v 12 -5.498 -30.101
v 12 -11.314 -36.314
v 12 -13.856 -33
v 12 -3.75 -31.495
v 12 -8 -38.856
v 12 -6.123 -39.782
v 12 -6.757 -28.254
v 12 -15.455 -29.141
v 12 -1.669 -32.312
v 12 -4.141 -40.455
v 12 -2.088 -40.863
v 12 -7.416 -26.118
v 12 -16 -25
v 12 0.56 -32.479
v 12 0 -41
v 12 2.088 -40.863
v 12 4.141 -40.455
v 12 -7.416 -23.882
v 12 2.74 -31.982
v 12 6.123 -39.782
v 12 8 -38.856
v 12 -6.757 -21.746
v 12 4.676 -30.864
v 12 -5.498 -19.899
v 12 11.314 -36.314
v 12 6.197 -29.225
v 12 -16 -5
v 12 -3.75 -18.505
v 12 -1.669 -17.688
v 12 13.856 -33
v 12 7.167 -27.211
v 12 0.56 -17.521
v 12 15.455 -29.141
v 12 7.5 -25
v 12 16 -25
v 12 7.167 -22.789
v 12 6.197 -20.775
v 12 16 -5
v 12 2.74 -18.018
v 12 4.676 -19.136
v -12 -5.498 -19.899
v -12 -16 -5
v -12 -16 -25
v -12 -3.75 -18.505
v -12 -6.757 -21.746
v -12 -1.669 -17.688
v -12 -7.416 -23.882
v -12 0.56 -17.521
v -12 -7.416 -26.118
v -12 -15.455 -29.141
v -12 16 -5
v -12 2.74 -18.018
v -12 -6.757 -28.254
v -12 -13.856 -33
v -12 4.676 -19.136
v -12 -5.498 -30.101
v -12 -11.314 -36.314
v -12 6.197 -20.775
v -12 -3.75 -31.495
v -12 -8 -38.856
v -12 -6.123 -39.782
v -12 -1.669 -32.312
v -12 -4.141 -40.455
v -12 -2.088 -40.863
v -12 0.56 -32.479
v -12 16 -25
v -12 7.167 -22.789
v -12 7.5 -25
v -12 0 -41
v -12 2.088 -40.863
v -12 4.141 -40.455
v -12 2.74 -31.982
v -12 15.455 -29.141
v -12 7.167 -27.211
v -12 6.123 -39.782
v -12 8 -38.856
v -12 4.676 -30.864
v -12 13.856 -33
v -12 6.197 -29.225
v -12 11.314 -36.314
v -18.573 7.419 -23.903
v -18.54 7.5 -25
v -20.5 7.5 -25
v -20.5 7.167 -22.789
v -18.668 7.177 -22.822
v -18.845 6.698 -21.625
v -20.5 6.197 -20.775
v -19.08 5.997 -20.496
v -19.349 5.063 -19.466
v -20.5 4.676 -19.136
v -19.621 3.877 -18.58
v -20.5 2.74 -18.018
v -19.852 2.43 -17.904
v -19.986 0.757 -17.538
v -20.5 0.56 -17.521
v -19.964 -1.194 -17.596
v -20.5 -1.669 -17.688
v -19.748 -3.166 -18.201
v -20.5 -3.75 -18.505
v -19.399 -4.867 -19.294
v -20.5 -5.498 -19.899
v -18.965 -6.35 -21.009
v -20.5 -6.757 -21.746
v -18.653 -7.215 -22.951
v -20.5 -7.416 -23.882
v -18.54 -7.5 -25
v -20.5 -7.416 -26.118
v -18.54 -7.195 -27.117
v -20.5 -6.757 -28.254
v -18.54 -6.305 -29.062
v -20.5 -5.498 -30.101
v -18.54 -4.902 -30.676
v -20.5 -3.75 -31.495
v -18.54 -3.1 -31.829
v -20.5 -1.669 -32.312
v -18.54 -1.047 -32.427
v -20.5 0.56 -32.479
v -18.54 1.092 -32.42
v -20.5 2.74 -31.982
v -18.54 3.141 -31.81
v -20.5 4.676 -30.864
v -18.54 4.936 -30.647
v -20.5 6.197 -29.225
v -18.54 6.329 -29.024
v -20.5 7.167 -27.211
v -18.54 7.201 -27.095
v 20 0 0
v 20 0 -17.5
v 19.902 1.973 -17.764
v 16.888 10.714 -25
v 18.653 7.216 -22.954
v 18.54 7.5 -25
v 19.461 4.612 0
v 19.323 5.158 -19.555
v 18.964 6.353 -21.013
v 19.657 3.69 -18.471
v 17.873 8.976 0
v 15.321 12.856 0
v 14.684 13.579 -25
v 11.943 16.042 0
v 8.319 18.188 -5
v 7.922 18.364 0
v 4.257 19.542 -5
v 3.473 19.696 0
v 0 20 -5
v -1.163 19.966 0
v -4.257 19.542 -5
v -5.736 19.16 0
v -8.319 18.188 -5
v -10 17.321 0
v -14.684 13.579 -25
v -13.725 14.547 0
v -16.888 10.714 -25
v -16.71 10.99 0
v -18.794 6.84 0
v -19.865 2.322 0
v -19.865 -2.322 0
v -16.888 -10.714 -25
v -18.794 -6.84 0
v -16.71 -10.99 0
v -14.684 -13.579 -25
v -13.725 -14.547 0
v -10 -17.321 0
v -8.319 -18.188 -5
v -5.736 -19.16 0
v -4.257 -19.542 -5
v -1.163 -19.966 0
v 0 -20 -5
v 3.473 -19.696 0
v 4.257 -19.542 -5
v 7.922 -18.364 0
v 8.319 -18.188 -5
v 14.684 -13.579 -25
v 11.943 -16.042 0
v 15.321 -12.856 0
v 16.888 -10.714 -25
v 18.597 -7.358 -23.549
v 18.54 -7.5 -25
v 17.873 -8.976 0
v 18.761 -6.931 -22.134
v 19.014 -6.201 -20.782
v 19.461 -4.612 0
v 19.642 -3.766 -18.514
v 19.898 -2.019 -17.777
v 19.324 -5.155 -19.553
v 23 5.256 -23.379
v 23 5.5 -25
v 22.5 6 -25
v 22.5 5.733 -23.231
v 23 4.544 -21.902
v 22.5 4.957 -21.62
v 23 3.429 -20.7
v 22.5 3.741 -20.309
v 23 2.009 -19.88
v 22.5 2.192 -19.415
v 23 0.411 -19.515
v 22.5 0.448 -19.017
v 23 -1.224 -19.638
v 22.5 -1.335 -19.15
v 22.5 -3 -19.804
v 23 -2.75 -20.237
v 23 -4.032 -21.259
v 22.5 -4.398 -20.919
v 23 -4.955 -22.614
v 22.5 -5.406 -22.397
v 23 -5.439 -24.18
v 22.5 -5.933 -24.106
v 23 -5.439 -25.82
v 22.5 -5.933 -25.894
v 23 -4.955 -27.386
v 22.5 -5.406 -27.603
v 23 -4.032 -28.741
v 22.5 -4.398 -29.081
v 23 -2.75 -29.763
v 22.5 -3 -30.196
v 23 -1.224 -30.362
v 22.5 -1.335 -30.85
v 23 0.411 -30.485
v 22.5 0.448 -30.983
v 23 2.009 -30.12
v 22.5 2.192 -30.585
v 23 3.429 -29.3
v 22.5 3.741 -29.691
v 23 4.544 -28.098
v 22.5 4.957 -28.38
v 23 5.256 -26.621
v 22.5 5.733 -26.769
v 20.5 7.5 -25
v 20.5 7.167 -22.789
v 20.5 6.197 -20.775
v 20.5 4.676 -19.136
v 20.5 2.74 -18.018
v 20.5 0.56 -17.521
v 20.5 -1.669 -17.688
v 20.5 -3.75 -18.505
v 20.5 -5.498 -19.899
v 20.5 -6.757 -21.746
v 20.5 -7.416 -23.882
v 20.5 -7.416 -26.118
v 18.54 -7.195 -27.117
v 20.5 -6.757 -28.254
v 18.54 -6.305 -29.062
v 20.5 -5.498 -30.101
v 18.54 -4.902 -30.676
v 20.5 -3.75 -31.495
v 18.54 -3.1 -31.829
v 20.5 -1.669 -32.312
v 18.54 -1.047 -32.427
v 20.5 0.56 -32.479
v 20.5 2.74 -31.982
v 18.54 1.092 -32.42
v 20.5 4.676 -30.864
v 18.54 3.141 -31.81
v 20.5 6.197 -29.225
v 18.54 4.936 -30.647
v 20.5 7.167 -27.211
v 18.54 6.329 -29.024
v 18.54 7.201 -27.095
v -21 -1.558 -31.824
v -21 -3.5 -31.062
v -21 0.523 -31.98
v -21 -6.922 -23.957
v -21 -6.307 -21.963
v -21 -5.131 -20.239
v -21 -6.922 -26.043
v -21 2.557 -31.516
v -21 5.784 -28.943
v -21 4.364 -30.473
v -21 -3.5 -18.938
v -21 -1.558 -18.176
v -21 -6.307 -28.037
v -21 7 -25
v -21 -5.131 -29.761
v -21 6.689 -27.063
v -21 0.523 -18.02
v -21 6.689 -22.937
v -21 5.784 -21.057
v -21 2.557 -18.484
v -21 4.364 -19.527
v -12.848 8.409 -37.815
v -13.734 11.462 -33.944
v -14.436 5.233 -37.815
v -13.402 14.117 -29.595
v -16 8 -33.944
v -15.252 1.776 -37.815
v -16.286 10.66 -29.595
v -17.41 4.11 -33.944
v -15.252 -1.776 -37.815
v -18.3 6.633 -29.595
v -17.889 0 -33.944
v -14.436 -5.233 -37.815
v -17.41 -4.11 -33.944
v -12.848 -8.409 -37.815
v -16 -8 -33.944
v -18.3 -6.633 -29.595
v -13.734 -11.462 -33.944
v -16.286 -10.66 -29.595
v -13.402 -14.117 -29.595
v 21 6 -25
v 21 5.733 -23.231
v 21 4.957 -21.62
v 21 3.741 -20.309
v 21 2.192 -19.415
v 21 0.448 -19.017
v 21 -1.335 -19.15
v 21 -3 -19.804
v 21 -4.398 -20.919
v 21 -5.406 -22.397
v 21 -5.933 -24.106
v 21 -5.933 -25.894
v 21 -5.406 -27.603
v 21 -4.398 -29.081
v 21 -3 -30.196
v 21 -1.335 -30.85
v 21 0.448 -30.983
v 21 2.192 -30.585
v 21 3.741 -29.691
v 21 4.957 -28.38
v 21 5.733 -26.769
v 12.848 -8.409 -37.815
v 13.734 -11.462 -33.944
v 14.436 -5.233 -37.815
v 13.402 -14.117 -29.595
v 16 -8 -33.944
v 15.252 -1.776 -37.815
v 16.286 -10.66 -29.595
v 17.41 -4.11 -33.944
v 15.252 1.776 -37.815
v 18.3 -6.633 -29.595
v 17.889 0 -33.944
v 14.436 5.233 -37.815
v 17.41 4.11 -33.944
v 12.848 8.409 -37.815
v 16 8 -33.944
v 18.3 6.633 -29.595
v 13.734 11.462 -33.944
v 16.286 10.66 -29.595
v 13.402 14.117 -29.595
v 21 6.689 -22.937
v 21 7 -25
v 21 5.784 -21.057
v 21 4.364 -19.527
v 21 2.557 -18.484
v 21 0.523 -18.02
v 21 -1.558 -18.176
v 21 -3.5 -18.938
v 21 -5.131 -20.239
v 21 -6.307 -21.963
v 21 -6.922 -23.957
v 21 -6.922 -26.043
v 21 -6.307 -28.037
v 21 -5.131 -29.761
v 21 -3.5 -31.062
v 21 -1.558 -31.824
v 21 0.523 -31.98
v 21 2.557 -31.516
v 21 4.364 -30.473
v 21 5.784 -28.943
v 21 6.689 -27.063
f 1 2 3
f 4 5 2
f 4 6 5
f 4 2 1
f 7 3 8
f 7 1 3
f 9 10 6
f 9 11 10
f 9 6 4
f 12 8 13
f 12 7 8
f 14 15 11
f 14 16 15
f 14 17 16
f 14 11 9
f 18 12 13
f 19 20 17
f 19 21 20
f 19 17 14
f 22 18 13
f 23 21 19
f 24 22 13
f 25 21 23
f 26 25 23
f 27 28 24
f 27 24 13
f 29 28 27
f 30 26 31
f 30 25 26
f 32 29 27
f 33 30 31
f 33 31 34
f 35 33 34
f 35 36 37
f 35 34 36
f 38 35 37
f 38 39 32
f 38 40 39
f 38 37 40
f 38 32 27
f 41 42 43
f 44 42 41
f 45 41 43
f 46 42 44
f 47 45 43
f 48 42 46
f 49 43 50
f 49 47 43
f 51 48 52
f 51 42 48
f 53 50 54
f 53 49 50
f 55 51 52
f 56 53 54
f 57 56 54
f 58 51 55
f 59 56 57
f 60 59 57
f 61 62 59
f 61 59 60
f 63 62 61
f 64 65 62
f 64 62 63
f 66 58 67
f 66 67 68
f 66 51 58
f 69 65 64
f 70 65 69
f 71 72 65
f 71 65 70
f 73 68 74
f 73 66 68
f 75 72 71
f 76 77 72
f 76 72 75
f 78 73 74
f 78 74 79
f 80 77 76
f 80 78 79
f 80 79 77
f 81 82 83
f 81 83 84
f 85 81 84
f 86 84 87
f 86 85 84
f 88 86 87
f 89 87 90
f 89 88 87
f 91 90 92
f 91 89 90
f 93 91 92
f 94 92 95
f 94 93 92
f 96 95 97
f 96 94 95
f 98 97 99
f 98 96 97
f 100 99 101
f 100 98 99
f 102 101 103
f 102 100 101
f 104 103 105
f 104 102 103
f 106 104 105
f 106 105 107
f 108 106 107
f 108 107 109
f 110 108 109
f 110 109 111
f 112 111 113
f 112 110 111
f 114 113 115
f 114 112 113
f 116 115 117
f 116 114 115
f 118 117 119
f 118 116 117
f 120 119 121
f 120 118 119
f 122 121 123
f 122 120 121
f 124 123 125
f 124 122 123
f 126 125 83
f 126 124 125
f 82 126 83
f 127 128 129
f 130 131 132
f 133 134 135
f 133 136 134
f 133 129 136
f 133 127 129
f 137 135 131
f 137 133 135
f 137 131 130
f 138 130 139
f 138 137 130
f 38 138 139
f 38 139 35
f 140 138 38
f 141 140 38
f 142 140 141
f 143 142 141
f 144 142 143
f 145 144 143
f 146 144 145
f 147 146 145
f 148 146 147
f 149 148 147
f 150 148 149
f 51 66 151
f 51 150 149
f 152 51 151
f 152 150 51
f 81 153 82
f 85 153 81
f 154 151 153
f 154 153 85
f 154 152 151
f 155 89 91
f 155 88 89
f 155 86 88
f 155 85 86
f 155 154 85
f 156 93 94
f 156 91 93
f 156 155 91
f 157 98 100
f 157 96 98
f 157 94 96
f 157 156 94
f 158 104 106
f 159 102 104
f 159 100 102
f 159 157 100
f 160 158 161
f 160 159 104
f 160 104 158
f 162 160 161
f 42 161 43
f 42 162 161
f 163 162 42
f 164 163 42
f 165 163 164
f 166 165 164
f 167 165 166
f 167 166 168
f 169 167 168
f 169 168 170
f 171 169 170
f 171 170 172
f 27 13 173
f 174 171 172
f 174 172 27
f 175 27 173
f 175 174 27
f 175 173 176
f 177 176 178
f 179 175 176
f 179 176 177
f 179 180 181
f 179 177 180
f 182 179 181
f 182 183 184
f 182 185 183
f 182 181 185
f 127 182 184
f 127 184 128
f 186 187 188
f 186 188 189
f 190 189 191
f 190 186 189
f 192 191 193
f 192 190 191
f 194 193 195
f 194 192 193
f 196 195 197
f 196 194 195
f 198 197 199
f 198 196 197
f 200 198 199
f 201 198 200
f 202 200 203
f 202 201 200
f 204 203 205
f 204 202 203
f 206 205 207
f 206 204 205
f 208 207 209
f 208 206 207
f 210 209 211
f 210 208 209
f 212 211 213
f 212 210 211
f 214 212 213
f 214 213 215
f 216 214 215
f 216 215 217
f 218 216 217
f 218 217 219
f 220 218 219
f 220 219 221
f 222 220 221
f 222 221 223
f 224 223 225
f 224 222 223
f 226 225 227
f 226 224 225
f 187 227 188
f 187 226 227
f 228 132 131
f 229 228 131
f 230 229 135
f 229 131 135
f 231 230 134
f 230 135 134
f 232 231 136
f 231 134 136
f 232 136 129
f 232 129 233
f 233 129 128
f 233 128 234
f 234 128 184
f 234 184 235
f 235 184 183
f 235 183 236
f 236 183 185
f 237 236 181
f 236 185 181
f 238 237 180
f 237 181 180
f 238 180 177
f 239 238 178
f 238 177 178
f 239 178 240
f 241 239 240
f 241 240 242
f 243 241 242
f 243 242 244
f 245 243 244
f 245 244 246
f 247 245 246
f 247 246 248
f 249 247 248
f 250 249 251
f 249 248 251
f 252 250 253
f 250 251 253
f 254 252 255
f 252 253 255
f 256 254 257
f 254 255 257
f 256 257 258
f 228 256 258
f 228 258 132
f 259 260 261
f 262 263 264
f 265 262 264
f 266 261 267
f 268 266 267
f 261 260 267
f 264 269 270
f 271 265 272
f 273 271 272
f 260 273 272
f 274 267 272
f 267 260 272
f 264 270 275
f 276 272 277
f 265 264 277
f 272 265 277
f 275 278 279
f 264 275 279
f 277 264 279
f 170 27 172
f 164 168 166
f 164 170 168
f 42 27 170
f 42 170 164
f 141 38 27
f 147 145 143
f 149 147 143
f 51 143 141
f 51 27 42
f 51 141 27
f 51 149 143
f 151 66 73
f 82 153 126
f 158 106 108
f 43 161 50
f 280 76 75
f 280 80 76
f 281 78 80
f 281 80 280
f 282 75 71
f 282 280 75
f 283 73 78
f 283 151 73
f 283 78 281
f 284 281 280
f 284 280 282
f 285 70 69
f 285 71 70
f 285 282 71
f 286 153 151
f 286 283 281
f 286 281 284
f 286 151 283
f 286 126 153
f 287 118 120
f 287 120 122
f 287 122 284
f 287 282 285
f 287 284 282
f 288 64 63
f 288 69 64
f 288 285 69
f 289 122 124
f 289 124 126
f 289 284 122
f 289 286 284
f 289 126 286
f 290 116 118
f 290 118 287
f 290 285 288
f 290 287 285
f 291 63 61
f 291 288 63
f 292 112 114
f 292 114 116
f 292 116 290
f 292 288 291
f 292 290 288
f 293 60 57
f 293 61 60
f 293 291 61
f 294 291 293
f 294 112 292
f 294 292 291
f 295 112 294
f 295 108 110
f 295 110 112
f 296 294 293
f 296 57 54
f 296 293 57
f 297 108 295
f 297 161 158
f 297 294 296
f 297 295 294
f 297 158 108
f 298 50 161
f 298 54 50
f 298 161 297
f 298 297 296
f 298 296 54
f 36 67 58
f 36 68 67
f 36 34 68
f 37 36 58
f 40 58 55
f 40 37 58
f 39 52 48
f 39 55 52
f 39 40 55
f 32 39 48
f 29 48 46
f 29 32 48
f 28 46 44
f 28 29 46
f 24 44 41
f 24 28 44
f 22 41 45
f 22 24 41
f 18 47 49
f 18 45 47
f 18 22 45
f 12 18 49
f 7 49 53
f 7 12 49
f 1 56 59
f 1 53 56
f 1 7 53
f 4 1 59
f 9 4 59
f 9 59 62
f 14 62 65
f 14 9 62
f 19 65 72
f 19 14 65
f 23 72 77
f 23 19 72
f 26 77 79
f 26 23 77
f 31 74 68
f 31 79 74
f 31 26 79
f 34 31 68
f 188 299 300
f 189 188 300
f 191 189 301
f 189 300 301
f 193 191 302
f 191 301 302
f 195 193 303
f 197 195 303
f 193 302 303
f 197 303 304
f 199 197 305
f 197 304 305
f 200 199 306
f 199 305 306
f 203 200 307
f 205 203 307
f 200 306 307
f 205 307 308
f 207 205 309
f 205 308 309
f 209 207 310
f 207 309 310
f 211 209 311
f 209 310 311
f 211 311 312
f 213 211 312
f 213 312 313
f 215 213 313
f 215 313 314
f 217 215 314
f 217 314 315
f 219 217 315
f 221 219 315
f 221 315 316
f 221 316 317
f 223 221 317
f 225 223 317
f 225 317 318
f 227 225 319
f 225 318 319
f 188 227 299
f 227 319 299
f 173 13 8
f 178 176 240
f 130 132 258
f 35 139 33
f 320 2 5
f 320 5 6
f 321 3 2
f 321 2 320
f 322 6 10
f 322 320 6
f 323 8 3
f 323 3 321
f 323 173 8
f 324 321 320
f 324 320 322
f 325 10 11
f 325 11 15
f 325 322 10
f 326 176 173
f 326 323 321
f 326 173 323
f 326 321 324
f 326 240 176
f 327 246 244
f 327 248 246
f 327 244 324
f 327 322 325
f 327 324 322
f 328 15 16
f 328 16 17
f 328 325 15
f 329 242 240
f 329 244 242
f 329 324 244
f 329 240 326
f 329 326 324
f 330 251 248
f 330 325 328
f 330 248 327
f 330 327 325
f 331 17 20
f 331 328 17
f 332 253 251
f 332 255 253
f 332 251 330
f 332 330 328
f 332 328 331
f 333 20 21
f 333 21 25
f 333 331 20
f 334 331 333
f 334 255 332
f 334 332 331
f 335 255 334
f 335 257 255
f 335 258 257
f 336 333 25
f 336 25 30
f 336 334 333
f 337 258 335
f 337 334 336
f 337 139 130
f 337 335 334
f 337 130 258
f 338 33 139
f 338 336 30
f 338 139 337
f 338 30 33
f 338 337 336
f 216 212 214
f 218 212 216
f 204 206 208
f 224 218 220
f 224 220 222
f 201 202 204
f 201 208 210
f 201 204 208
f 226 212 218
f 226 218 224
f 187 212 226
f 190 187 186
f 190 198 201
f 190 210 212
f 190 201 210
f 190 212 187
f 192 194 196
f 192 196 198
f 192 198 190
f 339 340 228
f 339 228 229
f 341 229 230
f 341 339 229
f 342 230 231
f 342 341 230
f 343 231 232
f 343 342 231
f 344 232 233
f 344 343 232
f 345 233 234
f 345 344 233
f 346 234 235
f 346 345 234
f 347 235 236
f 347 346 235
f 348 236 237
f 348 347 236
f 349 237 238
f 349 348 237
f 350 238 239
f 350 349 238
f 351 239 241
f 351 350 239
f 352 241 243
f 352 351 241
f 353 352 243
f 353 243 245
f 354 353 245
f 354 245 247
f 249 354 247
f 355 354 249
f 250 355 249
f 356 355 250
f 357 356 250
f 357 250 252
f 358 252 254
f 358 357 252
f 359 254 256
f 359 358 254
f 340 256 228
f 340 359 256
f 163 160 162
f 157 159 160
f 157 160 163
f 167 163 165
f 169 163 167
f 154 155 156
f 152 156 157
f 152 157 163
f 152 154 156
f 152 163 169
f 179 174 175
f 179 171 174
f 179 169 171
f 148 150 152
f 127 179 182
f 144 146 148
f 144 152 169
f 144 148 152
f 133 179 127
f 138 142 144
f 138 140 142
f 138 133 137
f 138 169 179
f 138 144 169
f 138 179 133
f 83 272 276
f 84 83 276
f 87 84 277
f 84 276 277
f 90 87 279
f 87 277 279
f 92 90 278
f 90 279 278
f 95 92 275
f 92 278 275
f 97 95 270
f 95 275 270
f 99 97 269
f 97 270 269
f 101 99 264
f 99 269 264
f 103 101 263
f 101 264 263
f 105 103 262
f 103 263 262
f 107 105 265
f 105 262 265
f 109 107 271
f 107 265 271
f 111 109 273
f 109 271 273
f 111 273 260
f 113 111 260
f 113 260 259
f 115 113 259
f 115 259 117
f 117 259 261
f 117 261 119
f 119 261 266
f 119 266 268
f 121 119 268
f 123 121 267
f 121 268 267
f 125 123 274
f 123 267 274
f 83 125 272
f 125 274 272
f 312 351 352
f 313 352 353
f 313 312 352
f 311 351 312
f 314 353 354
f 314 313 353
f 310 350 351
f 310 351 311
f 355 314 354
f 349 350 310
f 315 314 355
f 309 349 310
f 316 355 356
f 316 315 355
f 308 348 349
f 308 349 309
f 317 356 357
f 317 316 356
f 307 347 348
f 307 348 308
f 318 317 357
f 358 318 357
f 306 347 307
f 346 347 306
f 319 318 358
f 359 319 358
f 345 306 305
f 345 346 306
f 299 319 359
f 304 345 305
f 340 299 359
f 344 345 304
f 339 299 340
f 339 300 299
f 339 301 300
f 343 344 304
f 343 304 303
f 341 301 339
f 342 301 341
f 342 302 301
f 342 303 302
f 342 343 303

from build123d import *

# Parameters (mm, degrees)
F3_DEPTH      = 20.001
F3_DEPTH_BACK = 20.001
F4_R          = 7.5
F5_DEPTH      = 21
F7_R          = 6
F8_DEPTH      = 2
F8_DEPTH_BACK = 9
F9_SIZE       = 0.5


with BuildPart() as f1:
    # F0 (on Front) → F1 (revolve)
    with BuildSketch(Plane.XZ):
        with BuildLine():
            Line((20, 0), (0, 0))
            Line((0, 0), (0, -45))
            ThreePointArc((0, -45), (14.1421356237, -39.1421356237), (20, -25))
            Line((20, -25), (20, 0))
        make_face()
    revolve(axis=Axis((0, 0, 4.3592059342), (0, 0, 1)))

    # F2 (on Front) → F3 (cut, two sides)
    with BuildSketch(Plane.XZ) as f3_sk:
        Polygon((0, -45), (12, -45), (12, -5), (0, -5), (-12, -5), (-12, -45), align=None)
    extrude(amount=-F3_DEPTH, mode=Mode.SUBTRACT)
    extrude(f3_sk.sketch, amount=F3_DEPTH_BACK, mode=Mode.SUBTRACT)

    # F4 (on Right) → F5 (join, through all)
    with BuildSketch(Plane.YZ):
        with Locations((0, -25)):
            Circle(F4_R)
    extrude(amount=F5_DEPTH)

    # F6: F1 across plane


with BuildPart() as f1_1:
    add(f1.part)
    add(f1.part.mirror(Plane.YZ))

    # F7 (on face) → F8 (join, two sides)
    with BuildSketch(Plane.YZ.offset(21)) as f8_sk:
        with Locations((0, -25)):
            Circle(F7_R)
    extrude(amount=F8_DEPTH)
    extrude(f8_sk.sketch, amount=-F8_DEPTH_BACK)

    # F9
    f9_edges = [f1_1.edges().sort_by_distance(p)[0] for p in [
        (23, -6, -25),
        (-21, -7.5, -25),
        (21, -7.5, -25),
    ]]
    chamfer(f9_edges, length=F9_SIZE)


solid = f1_1.part
